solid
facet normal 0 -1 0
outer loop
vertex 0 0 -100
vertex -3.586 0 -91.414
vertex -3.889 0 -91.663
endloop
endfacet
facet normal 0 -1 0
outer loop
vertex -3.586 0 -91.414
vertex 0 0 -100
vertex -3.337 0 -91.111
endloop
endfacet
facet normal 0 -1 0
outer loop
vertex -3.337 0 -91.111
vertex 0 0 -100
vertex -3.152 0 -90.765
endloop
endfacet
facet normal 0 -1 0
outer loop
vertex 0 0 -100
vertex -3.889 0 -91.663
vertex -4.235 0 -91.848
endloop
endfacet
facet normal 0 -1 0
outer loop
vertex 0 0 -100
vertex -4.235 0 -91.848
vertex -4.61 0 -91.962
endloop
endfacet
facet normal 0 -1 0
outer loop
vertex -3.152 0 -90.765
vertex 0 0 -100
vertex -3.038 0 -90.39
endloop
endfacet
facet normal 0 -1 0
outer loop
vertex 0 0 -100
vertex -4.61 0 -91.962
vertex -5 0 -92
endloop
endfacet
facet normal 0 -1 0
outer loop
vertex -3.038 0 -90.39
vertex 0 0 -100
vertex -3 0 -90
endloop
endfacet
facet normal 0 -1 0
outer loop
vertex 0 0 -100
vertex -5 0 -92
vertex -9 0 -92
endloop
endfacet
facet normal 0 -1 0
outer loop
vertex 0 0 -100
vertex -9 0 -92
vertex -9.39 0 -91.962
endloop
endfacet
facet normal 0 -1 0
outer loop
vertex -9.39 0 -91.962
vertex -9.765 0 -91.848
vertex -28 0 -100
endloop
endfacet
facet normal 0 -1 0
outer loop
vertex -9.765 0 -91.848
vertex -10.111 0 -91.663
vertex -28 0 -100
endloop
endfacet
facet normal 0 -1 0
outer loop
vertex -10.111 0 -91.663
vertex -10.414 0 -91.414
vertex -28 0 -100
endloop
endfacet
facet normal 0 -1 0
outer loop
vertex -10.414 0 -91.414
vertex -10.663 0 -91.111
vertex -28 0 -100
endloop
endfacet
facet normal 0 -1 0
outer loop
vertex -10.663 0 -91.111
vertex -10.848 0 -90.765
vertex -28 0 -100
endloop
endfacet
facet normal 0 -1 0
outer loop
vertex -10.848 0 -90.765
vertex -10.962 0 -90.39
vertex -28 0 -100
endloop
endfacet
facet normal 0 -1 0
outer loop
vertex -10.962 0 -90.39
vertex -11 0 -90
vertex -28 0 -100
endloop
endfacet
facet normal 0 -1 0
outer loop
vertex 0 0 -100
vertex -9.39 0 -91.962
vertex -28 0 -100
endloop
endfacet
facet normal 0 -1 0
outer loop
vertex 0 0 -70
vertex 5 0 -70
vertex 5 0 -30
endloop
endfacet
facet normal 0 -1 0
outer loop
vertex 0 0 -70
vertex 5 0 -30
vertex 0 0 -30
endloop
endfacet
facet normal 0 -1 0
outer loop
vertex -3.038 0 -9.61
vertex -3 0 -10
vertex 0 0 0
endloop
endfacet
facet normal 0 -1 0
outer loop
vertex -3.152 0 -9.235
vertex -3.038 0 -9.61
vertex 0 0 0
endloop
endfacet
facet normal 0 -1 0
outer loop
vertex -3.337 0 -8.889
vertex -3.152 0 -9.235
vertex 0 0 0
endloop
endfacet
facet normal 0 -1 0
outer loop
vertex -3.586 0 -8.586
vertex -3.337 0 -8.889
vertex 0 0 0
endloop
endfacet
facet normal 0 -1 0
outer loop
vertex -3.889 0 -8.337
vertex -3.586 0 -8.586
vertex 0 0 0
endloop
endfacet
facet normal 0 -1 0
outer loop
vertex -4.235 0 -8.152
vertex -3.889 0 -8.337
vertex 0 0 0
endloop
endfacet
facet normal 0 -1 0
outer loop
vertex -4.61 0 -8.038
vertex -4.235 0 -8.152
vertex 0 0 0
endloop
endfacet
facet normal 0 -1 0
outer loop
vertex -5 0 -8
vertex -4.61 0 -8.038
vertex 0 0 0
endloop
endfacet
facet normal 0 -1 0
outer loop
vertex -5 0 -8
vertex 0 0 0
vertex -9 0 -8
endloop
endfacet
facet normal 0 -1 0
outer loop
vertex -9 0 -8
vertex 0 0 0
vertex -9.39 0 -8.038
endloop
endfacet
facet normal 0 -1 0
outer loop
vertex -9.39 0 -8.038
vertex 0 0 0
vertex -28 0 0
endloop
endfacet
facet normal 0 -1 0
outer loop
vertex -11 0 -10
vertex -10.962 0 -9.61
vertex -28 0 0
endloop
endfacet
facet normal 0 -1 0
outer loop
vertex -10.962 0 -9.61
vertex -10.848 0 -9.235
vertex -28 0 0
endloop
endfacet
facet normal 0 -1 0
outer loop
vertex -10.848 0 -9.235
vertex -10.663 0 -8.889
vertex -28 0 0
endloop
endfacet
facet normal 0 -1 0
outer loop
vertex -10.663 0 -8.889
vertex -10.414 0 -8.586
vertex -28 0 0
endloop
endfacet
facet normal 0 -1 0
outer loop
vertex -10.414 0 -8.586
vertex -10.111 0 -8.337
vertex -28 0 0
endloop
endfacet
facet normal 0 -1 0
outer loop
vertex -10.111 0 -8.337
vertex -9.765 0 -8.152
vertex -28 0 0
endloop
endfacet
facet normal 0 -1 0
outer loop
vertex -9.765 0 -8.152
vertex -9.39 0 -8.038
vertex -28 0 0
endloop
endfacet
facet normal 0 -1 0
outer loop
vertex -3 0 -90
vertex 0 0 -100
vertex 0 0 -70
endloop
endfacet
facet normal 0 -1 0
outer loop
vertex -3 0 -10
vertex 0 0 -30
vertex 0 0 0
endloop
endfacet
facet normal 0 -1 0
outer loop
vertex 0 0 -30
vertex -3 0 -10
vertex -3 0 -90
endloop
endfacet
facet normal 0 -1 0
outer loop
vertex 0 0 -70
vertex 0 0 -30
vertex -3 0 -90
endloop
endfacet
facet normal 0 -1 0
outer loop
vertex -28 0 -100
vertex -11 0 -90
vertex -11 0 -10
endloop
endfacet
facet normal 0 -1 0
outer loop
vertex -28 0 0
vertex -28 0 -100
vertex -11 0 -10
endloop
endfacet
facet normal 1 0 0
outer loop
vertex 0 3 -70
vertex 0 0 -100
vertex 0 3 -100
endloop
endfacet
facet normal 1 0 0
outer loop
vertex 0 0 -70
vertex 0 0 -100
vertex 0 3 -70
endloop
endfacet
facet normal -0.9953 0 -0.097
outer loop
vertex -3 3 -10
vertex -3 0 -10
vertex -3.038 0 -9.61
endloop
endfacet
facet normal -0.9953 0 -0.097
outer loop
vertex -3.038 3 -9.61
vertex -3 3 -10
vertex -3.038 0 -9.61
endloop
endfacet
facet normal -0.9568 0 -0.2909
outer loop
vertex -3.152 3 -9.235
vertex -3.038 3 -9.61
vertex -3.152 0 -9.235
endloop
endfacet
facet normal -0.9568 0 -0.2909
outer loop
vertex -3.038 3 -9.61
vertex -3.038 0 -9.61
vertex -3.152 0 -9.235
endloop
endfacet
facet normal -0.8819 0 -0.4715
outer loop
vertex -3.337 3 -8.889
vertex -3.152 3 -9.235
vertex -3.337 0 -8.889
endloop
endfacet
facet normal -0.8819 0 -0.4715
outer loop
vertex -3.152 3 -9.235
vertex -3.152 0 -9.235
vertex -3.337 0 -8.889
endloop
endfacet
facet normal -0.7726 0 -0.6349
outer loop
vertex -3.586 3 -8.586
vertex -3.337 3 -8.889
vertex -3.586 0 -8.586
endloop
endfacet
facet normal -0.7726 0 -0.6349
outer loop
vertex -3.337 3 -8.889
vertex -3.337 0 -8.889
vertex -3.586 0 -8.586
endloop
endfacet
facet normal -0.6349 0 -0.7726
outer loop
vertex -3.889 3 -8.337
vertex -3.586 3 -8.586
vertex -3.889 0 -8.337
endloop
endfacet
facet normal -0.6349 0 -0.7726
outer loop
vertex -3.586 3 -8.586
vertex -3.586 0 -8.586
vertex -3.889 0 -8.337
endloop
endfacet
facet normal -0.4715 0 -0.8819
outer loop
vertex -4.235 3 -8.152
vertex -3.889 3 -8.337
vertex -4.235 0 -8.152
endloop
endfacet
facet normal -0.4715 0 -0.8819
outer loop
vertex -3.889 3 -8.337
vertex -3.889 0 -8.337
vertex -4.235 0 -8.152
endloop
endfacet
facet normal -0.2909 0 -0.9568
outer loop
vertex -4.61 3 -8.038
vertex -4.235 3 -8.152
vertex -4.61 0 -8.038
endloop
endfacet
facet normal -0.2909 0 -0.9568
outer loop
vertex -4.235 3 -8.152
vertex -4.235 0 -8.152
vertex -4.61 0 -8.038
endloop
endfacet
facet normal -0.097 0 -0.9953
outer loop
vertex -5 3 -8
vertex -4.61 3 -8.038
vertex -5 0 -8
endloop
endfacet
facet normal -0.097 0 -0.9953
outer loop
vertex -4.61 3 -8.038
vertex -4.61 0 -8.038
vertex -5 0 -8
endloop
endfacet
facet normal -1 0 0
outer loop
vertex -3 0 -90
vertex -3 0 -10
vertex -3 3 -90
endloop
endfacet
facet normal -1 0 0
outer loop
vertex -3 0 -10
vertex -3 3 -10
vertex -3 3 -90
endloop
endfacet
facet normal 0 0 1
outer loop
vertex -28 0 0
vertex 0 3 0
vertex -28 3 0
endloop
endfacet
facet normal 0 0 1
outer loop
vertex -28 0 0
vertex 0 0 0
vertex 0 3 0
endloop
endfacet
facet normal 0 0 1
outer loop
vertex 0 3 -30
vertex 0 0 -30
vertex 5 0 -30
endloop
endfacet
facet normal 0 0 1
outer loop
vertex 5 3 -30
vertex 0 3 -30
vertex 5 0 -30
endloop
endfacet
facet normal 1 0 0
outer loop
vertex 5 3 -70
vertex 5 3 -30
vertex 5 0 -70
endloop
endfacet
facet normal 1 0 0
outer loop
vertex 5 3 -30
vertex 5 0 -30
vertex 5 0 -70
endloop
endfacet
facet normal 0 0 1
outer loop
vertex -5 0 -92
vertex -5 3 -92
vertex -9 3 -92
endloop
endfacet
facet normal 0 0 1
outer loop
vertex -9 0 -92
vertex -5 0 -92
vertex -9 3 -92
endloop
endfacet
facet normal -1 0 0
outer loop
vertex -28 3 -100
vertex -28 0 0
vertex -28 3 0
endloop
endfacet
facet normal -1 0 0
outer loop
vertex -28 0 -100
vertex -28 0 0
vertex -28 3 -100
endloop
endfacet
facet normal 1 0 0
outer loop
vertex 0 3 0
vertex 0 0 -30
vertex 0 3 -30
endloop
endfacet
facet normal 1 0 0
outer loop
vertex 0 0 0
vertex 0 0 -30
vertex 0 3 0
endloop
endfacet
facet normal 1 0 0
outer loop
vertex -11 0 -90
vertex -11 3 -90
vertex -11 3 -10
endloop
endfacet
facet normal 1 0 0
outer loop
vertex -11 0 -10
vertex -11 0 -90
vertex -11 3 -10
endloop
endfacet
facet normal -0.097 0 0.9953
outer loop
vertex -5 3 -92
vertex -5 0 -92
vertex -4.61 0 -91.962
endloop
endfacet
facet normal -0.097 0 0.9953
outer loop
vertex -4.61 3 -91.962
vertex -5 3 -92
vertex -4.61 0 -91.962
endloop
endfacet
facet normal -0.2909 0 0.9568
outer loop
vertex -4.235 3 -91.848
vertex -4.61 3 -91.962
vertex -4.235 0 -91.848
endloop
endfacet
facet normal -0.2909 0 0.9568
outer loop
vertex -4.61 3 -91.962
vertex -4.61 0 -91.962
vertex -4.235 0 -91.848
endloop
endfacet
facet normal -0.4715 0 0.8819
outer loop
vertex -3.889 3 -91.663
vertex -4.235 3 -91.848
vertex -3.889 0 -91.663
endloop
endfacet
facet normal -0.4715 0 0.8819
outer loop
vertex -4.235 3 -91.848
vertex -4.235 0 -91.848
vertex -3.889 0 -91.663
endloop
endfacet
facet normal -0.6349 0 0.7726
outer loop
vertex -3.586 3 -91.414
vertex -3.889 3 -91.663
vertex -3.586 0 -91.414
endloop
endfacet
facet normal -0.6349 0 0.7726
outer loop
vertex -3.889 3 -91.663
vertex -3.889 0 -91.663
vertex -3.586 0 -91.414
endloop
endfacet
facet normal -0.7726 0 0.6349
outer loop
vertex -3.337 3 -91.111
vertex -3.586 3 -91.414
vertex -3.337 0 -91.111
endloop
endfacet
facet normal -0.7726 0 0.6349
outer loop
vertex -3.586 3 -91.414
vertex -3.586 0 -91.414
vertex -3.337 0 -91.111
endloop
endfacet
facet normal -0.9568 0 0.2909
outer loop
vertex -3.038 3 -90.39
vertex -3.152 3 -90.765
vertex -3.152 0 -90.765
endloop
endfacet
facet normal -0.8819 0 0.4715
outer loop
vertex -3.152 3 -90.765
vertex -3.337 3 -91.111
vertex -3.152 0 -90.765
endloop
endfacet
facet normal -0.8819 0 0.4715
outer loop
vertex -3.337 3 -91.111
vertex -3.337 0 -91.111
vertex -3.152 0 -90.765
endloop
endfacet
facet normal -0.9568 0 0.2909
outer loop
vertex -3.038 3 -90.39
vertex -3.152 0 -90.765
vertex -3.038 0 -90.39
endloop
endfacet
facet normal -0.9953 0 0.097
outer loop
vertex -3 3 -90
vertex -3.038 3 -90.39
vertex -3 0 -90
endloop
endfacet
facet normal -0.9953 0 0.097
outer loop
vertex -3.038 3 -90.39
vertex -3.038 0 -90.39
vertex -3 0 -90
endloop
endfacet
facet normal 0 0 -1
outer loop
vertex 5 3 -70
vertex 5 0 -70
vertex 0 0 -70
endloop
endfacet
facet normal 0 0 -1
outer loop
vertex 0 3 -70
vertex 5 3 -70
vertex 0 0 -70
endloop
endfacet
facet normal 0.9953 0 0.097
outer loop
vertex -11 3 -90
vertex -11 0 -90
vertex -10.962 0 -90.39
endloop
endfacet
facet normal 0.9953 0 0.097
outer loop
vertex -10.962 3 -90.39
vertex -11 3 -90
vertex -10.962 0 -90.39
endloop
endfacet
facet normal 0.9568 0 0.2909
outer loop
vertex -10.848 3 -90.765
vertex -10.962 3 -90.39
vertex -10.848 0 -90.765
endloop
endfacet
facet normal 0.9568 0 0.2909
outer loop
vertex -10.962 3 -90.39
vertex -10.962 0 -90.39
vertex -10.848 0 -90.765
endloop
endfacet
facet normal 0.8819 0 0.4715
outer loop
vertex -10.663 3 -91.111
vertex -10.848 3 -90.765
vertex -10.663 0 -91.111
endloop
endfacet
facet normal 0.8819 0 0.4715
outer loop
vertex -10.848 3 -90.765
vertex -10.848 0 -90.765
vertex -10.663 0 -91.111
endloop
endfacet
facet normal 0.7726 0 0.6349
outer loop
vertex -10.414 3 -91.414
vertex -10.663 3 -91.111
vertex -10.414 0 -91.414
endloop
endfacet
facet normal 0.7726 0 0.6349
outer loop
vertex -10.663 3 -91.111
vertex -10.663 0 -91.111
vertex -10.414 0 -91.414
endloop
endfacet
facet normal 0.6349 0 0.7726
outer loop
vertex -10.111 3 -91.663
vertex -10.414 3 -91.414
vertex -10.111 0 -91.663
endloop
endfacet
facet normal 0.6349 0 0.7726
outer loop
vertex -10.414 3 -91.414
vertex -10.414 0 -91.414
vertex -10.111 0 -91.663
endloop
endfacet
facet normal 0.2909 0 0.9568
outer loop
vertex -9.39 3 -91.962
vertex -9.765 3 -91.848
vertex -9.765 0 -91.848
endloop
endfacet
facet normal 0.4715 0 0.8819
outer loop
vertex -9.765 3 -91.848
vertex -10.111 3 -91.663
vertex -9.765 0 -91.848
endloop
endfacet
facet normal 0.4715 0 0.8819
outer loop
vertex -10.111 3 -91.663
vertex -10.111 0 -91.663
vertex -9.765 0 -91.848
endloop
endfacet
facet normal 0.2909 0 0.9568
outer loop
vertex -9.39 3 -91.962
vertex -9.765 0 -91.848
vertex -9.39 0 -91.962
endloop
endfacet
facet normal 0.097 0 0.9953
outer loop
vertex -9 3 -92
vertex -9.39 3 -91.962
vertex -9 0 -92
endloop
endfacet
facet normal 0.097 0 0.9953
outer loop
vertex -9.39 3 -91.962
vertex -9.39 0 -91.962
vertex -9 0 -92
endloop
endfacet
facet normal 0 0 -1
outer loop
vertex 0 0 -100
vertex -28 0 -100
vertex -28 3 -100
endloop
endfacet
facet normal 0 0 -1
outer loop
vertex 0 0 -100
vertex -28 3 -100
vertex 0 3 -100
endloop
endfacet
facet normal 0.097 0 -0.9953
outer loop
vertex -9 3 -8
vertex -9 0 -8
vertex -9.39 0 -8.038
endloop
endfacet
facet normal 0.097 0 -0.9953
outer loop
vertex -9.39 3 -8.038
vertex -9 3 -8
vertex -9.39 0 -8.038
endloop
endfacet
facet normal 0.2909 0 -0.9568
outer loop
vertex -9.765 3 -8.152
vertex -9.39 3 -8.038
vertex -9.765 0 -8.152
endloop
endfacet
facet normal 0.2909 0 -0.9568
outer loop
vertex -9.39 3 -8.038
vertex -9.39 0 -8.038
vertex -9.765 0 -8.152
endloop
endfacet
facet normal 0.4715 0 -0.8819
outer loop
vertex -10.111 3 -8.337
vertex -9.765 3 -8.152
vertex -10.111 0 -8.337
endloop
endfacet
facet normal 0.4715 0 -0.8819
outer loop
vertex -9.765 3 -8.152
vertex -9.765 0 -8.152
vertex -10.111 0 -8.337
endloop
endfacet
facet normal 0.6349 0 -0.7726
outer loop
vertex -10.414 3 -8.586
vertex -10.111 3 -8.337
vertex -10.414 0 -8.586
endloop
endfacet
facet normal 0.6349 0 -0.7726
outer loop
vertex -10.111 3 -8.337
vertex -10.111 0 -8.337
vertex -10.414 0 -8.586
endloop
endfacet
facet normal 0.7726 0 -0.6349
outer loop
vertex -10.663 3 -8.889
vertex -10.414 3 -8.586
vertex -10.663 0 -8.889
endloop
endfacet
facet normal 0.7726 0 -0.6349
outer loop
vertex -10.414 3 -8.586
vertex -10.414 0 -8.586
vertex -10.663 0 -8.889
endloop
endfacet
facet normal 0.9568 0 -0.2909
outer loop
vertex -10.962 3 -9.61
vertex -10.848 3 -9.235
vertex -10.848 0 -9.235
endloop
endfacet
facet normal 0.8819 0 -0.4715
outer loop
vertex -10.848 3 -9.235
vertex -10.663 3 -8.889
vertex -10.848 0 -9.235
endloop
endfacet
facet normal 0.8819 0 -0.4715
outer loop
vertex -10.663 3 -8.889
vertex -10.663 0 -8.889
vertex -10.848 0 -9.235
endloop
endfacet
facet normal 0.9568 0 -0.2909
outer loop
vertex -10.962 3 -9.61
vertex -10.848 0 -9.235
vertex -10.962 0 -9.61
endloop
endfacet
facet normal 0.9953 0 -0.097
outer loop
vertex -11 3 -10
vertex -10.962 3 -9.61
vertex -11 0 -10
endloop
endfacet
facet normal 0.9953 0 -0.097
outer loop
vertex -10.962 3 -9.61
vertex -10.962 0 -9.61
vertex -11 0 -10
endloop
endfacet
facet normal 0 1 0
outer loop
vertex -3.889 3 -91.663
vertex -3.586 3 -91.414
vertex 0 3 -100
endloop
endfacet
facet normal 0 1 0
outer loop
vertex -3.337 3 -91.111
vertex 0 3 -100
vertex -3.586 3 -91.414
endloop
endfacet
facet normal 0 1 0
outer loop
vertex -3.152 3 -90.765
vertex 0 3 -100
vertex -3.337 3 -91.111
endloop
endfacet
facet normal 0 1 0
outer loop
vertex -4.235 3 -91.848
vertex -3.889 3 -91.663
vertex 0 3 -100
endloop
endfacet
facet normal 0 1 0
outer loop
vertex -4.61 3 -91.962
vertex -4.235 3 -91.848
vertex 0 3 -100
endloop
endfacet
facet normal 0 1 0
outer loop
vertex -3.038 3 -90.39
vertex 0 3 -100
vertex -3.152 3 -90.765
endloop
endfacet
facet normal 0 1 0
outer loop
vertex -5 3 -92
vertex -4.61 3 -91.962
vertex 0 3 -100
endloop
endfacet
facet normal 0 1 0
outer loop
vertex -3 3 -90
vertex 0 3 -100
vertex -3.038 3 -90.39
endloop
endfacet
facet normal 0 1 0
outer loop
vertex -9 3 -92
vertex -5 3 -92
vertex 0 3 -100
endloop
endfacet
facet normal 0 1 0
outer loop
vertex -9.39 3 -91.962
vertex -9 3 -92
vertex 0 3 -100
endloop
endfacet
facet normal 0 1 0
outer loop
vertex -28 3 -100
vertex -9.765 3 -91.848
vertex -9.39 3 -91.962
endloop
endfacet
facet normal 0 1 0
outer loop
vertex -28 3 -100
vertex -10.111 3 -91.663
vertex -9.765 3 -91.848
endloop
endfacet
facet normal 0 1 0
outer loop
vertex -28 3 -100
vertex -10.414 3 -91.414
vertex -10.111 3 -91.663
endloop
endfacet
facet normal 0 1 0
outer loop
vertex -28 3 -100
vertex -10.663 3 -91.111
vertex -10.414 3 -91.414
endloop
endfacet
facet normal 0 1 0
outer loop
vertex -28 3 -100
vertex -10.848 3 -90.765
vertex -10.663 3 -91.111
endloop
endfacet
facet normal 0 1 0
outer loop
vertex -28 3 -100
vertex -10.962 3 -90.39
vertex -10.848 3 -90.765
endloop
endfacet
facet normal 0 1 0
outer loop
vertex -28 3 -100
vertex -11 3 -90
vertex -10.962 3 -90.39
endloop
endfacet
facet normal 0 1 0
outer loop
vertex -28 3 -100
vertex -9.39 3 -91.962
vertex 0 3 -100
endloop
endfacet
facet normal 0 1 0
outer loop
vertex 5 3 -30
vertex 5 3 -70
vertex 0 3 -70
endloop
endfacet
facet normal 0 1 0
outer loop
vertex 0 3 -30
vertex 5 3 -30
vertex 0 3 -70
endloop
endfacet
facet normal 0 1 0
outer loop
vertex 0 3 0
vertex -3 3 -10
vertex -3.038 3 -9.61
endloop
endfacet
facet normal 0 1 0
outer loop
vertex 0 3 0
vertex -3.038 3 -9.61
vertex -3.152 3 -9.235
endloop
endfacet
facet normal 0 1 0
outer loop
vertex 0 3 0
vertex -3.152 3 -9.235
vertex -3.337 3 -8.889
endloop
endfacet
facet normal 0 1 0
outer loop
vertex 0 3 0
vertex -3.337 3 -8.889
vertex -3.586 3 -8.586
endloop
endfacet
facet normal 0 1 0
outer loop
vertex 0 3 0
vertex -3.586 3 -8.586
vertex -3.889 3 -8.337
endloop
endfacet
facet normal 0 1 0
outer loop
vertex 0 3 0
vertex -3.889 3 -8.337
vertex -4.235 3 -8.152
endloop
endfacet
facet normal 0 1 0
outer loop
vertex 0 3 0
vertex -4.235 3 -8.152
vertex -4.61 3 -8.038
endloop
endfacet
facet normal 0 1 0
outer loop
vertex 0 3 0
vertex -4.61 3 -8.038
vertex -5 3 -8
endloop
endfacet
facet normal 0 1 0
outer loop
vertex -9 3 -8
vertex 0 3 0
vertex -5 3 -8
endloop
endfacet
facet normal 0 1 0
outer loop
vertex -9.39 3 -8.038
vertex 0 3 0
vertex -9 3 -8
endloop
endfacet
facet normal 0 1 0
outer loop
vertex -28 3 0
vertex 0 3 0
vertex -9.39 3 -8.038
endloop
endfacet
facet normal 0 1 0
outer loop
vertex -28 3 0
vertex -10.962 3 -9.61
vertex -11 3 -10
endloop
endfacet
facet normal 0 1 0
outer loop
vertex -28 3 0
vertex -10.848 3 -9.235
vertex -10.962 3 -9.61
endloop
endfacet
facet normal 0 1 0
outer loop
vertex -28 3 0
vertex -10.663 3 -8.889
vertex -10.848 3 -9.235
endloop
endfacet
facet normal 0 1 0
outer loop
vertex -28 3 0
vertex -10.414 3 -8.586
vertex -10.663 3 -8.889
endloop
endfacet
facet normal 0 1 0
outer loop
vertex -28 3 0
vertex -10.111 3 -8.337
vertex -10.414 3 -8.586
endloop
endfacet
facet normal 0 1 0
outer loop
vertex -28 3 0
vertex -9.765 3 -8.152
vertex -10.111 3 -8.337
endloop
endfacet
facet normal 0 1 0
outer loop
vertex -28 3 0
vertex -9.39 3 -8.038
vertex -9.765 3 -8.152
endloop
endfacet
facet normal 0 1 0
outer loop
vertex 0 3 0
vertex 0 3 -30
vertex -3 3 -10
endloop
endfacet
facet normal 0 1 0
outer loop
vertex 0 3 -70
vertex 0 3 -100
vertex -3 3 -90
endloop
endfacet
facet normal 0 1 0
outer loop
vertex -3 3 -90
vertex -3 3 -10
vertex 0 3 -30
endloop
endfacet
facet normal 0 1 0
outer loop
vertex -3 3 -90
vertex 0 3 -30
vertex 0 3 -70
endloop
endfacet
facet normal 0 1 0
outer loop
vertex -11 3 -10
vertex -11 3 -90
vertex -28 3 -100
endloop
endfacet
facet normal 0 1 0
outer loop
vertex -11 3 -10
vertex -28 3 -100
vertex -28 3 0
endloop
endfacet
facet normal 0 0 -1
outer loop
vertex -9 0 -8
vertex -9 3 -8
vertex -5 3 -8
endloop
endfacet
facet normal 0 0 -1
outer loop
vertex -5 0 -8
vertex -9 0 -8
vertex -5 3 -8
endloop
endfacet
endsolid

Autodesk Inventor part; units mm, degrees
ref_plane "YZ Plane" through (0, 0, 0) normal (1, 0, 0) x (0, 1, 0)
ref_plane "XZ Plane" through (0, 0, 0) normal (0, 1, 0) x (-1, 0, 0)
ref_plane "XY Plane" through (0, 0, 0) normal (0, 0, 1) x (1, 0, 0)
sketch "Sketch1" plane through (0, 0, 0) normal (0, 1, 0) x (-1, 0, 0)
  line L0 (0, 0) -> (28, 0)
  line L1 (28, 0) -> (28, -100)
  line L2 (28, -100) -> (0, -100)
  line L3 (0, -100) -> (0, 0)
  line L4 (0, -30) -> (-5, -30)
  line L5 (-5, -30) -> (-5, -70)
  line L6 (-5, -70) -> (0, -70)
  line L7 (0, -70) -> (0, -30)
  line L8 (28, -50) -> (0, -50) construction
  line L9 (-5, -50) -> (0, -50) construction
  point P0 (0, -70)
  dimension "d0" = 100
  dimension "d1" = 5
  dimension "d2" = 40
  dimension "d3" = 28
extrude "Extrusion1" add sketch "Sketch1" along normal blind 3
sketch "Sketch4" plane through (0, 3, 0) normal (0, 1, 0) x (1, 0, 0)
  line L0 (-3, 92) -> (-11, 92)
  line L1 (-11, 92) -> (-11, 8)
  line L2 (-11, 8) -> (-3, 8)
  line L3 (-3, 8) -> (-3, 92)
  line L4 (0, 70) -> (0, 100) projected
  line L5 (0, 100) -> (-28, 100) projected
  point P0 (0, 0)
  dimension "d24" = 3
  dimension "d25" = 8
  dimension "d26" = 84
  dimension "d27" = 8
extrude "Extrusion4" cut sketch "Sketch4" against normal blind 10
fillet "Fillet1" radius 2 4 edges at (-11, 1.5, -92) (-3, 1.5, -92) (-11, 1.5, -8) (-3, 1.5, -8)
properties part number "Lateral BNC"
